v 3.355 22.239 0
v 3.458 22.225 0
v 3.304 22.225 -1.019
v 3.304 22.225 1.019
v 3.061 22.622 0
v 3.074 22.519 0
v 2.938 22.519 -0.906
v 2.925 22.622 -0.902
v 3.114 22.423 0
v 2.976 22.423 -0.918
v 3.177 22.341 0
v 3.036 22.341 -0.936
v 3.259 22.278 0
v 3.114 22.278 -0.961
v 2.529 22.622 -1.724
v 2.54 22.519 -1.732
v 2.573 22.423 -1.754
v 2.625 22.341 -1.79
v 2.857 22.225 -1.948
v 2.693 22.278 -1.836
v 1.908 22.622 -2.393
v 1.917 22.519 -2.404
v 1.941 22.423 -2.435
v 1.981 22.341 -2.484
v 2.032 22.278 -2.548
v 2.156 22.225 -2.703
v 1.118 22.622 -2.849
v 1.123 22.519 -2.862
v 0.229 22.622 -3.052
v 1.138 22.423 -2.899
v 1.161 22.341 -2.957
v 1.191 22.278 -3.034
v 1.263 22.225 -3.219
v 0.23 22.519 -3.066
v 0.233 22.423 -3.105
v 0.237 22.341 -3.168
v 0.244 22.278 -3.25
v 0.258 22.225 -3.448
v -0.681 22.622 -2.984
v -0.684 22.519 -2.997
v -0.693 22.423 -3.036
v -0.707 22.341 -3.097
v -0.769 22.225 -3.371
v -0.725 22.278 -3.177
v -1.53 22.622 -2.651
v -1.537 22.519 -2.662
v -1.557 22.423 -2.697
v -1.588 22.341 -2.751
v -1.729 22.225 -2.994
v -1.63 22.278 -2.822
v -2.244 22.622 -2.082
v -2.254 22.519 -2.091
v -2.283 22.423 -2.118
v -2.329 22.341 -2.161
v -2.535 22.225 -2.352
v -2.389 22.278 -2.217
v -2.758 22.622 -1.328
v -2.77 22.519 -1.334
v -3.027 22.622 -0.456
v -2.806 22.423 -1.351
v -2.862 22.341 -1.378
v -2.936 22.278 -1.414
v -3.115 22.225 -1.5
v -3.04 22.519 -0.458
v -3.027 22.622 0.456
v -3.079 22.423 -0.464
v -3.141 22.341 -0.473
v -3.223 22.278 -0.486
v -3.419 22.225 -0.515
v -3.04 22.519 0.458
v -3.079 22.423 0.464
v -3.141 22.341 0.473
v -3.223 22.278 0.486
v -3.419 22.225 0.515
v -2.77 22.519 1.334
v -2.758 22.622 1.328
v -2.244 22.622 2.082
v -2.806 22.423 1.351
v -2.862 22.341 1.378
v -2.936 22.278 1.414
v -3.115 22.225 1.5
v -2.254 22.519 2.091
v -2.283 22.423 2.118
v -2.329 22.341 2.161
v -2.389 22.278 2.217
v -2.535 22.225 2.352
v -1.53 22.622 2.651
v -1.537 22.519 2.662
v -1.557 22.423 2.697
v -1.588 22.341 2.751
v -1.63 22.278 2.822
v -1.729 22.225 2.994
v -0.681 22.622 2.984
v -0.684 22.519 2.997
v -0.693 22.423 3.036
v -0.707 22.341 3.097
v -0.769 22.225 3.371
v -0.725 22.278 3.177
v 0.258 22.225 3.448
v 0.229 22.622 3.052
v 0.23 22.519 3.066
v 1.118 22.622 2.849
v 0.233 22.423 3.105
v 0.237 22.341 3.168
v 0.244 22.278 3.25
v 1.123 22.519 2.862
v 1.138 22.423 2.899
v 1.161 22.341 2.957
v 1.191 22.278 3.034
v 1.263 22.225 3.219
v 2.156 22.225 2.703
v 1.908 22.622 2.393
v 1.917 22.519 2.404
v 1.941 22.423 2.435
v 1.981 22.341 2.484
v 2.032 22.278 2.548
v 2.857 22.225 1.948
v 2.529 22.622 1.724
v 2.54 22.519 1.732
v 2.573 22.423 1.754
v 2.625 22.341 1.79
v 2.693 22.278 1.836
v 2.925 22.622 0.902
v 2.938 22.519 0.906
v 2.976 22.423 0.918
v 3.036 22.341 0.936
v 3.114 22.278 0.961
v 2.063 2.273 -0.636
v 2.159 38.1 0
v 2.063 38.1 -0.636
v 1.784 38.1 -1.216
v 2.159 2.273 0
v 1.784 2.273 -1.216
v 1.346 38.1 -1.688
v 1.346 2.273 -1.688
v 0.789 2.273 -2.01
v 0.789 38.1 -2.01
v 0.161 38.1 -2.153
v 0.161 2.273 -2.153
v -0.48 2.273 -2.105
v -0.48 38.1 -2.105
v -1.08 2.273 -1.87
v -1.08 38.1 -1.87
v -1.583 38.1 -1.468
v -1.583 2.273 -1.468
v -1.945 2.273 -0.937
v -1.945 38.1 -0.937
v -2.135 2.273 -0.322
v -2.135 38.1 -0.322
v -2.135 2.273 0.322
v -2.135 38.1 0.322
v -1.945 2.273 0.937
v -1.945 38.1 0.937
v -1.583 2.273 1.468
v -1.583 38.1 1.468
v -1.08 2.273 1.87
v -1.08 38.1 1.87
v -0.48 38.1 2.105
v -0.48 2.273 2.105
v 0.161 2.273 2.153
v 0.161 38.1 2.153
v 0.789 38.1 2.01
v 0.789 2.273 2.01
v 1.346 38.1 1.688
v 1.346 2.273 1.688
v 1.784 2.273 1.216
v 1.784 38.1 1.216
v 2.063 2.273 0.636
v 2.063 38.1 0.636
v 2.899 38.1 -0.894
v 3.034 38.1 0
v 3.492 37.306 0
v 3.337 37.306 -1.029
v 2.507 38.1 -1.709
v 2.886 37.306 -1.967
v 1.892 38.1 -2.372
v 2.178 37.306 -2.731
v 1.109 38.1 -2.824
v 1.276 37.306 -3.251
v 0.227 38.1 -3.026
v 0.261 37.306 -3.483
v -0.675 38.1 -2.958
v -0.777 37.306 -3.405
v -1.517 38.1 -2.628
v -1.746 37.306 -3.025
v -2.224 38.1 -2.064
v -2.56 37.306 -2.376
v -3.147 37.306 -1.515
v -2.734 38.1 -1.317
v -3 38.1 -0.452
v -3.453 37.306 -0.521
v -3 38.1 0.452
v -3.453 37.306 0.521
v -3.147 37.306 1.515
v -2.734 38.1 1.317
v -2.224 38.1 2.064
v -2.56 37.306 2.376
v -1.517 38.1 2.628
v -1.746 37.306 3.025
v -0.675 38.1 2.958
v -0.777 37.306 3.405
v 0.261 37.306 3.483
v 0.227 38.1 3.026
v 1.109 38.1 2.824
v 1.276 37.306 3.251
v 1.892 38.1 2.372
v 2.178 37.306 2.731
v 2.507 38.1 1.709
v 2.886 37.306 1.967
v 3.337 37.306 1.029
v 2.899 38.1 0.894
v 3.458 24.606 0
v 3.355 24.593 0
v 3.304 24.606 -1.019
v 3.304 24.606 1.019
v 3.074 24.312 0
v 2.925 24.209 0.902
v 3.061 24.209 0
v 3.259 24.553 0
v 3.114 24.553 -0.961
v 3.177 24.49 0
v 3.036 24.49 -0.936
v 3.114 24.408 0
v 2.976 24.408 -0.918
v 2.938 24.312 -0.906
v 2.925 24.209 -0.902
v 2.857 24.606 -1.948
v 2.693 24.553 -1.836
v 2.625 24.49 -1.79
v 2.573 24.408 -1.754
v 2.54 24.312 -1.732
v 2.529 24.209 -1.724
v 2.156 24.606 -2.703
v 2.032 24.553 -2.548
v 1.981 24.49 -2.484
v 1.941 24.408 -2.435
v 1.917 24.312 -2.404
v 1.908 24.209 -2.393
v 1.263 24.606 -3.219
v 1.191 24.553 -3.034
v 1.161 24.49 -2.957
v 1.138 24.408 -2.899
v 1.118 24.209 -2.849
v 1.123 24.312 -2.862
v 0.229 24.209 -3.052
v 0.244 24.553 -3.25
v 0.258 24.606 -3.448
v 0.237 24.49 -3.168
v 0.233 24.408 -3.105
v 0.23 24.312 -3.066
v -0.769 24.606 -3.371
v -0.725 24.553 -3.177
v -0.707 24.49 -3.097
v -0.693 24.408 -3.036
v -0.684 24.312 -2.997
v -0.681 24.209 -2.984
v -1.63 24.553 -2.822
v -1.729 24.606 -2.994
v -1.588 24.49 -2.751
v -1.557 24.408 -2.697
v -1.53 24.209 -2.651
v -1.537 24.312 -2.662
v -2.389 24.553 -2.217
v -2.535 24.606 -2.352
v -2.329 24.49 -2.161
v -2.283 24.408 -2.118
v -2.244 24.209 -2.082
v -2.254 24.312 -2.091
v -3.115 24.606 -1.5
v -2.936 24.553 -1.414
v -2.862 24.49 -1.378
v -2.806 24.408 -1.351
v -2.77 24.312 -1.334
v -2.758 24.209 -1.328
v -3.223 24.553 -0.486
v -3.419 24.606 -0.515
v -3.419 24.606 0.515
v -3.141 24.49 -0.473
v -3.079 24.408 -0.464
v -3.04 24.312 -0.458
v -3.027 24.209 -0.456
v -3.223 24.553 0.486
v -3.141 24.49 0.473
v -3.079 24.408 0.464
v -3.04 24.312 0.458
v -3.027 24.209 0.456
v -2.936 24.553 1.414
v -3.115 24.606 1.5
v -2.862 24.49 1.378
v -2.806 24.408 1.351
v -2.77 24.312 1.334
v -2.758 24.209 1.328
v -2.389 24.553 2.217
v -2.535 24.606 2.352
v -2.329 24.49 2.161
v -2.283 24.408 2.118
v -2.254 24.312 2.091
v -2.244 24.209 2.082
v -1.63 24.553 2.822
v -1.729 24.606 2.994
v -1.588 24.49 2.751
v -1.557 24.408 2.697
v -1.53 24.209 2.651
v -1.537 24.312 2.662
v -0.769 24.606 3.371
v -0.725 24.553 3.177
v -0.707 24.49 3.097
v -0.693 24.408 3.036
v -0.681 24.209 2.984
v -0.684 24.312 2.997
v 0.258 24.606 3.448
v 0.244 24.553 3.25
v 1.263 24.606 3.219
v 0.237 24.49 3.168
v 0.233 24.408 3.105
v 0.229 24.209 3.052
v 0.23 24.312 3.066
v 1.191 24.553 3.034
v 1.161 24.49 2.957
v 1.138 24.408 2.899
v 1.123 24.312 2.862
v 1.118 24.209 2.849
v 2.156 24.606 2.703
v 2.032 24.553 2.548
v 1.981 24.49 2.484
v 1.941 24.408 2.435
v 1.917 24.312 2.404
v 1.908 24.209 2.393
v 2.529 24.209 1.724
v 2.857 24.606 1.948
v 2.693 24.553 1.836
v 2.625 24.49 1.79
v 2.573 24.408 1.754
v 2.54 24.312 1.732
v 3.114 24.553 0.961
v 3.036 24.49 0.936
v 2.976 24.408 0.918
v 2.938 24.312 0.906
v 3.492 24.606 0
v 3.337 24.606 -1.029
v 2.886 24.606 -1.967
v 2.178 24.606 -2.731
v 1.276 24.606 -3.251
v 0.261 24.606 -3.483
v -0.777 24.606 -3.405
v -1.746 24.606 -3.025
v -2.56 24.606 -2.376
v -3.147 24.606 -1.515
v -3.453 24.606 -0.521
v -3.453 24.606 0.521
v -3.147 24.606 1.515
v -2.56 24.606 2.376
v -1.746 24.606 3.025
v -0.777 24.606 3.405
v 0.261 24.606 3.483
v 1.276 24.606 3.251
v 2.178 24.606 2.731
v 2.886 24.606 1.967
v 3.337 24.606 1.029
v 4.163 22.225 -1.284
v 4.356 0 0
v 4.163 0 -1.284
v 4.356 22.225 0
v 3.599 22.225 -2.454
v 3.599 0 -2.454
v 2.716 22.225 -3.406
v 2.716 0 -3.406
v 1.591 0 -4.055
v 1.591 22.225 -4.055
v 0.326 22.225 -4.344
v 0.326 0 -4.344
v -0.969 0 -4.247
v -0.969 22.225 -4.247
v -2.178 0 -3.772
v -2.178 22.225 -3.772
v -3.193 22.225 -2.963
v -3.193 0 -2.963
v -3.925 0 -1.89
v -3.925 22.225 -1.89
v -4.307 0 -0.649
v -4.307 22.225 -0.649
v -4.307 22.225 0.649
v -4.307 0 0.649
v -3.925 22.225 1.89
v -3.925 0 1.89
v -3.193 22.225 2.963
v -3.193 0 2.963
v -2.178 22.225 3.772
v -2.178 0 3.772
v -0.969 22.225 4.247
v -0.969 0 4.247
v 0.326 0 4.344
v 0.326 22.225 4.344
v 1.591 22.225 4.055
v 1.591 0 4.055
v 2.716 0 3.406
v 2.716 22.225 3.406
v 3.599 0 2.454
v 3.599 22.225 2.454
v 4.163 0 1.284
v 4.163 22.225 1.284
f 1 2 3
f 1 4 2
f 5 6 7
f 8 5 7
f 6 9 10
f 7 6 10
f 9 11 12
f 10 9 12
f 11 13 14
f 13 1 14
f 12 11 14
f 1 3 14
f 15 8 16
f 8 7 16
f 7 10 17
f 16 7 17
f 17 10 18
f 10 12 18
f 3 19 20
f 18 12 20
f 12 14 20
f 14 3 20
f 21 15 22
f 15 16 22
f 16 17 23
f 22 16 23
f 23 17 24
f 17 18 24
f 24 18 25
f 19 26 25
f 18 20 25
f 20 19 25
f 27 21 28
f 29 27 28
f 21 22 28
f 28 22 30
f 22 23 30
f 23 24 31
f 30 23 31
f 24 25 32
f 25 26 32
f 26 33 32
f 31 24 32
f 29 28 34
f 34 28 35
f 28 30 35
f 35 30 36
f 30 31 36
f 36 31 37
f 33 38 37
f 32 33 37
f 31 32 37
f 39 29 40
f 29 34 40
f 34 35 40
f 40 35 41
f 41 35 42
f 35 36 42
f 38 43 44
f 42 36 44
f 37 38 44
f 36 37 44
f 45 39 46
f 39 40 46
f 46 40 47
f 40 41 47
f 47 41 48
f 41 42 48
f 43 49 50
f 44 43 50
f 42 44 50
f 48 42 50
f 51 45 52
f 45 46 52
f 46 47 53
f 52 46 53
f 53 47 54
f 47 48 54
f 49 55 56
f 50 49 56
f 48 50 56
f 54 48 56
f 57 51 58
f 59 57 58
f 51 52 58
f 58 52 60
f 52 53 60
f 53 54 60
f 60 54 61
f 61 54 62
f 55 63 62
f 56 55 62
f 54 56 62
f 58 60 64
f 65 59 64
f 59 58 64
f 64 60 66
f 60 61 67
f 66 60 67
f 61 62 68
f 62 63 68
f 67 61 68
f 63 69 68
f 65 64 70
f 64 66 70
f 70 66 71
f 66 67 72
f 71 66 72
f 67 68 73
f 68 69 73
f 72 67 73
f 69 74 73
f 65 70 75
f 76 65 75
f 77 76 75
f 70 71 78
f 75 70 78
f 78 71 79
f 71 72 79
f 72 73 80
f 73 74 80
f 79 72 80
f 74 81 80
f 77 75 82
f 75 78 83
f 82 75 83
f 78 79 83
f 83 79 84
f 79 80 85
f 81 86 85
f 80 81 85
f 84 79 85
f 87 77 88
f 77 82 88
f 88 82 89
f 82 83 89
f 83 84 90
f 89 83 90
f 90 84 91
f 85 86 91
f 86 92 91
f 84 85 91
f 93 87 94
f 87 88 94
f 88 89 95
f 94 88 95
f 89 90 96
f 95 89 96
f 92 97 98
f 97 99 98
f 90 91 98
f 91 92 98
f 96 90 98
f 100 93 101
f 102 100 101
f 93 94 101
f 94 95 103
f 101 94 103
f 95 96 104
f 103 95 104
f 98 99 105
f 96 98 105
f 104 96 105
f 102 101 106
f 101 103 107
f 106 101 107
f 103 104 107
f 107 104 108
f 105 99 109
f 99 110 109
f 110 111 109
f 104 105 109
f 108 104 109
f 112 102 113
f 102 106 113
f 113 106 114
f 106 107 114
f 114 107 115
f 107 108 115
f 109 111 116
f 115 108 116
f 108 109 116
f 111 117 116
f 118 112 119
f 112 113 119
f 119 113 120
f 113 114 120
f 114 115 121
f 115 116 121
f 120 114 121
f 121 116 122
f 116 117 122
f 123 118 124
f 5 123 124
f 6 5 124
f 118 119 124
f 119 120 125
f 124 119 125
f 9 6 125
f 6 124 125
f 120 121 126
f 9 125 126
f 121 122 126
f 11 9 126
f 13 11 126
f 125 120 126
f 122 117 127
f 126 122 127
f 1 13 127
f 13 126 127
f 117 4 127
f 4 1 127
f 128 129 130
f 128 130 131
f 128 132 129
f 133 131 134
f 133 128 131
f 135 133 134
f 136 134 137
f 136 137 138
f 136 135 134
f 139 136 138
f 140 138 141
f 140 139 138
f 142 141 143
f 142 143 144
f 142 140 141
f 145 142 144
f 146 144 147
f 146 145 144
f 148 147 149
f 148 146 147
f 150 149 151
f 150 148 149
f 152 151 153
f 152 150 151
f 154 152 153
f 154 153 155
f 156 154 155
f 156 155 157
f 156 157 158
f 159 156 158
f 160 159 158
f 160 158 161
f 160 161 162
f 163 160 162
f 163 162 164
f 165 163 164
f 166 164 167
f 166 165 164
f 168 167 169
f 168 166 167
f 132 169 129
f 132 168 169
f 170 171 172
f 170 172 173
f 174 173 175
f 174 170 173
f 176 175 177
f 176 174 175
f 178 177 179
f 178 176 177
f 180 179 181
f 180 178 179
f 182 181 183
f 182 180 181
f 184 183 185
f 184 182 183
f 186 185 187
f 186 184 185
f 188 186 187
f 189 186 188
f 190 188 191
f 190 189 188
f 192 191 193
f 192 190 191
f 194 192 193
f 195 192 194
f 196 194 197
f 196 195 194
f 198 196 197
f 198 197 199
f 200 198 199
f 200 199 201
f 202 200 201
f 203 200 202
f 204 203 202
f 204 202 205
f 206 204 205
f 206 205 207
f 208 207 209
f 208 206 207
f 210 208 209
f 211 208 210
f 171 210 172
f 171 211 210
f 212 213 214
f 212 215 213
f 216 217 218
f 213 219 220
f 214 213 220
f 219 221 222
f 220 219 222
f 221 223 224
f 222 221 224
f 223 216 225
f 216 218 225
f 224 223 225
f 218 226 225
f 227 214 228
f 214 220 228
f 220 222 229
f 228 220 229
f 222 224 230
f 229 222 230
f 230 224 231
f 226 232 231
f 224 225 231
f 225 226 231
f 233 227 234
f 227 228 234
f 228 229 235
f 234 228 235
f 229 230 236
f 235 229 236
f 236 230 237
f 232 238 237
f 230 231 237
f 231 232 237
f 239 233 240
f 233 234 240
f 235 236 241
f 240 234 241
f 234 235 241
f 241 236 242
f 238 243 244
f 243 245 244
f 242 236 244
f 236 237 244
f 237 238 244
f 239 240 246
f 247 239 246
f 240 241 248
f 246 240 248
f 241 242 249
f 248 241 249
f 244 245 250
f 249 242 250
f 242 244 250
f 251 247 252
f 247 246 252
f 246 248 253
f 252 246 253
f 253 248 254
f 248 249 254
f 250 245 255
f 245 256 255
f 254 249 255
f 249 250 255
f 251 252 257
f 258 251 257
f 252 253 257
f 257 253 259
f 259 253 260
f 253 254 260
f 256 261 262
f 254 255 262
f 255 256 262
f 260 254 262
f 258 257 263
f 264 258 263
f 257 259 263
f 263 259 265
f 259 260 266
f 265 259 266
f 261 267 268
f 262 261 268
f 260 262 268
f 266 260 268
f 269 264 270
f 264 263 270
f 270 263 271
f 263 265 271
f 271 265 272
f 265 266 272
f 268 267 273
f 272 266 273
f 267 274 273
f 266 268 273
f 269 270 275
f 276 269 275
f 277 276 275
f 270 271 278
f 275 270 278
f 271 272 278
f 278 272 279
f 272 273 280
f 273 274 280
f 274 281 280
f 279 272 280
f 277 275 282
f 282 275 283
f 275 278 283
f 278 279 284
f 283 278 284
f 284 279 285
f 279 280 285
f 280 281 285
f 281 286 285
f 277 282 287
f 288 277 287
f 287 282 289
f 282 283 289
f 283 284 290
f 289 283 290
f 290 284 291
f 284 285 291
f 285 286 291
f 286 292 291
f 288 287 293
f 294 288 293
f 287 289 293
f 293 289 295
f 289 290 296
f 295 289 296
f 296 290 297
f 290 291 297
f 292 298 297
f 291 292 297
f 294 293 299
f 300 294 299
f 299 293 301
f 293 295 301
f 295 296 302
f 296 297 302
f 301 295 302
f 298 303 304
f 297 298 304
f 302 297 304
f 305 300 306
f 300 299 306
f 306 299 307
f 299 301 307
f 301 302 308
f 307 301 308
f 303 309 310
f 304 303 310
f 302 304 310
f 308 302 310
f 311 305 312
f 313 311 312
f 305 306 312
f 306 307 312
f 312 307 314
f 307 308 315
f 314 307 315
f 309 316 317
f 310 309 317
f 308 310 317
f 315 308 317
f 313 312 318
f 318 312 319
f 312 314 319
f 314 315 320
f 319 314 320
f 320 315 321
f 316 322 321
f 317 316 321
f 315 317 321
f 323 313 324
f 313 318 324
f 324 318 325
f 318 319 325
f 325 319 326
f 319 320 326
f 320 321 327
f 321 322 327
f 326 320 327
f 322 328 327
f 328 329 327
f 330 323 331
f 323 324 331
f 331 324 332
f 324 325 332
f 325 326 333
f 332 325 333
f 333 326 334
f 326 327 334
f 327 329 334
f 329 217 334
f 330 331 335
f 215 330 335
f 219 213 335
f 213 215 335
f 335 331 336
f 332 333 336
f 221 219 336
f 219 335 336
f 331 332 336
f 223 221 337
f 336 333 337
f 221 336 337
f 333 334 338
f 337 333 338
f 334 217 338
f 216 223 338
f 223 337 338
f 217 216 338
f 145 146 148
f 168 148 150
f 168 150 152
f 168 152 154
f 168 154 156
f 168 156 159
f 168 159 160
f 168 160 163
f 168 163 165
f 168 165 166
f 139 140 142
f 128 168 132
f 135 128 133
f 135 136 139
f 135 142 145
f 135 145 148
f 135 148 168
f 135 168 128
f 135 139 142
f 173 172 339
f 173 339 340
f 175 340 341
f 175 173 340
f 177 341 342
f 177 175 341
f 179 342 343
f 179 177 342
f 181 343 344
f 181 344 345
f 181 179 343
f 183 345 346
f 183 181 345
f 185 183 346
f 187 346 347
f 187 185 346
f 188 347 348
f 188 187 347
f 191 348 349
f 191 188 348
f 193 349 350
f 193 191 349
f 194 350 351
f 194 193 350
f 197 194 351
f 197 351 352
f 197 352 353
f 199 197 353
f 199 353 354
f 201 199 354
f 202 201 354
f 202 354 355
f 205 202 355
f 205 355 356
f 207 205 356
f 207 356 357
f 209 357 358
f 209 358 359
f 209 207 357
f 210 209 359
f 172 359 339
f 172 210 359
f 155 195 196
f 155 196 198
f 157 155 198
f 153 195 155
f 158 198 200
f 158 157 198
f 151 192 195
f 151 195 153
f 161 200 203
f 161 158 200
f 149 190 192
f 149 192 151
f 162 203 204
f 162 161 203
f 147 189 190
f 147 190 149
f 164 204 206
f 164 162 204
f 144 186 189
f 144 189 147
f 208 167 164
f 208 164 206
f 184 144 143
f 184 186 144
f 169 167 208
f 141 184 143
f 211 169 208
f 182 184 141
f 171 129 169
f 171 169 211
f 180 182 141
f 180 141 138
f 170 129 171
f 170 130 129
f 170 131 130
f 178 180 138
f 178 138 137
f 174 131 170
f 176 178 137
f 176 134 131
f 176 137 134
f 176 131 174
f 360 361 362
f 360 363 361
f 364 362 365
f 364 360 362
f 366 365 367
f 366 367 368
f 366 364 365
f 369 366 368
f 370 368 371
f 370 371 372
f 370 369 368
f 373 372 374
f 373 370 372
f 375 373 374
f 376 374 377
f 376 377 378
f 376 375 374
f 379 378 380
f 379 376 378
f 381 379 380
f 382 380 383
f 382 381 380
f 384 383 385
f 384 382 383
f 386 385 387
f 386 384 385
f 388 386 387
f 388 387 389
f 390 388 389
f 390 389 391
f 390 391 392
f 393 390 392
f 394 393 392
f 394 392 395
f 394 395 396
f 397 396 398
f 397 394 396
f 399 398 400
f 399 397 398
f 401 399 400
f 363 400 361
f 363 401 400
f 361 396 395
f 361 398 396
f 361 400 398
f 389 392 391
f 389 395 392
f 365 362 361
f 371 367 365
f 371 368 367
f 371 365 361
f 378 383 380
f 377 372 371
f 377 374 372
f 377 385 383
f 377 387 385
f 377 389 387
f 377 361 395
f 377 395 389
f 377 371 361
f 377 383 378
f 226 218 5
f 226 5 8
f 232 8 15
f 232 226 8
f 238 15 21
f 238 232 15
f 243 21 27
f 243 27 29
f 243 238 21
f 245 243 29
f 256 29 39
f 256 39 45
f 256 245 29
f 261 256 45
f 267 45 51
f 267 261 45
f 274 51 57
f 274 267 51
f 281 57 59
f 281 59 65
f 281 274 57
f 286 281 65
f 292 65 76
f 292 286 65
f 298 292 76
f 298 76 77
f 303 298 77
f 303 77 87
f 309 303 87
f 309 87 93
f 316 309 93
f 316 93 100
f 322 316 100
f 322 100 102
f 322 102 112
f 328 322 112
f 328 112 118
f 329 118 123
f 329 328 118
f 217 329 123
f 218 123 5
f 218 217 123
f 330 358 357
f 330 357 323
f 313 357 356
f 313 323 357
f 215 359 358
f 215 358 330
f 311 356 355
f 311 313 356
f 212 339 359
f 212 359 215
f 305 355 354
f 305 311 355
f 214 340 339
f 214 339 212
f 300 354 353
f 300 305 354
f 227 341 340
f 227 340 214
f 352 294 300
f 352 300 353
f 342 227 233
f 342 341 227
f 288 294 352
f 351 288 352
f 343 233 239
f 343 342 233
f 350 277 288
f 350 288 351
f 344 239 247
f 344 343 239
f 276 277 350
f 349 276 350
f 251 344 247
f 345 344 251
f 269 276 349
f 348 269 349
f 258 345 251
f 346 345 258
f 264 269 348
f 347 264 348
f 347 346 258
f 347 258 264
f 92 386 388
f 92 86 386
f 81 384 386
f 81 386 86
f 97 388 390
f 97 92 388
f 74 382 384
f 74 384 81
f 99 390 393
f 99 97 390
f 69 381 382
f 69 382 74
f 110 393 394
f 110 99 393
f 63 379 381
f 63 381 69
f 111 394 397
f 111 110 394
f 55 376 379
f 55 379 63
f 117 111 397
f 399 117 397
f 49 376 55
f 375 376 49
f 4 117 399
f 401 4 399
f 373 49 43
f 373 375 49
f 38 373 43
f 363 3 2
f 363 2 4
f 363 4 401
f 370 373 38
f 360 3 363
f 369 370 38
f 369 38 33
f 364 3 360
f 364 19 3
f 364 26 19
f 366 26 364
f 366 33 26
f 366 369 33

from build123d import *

# Parameters (mm, degrees)
CHAMFER1_SIZE  = 0.79375
CHAMFER1_SIZE2 = 0.458271776
FILLET1_R      = 0.396875


with BuildPart() as part:
    # Sketch1 → Revolve1 (revolve)
    with BuildSketch(Plane.XY):
        Polygon((0, 0), (4.3561, 0), (4.3561, 22.225), (3.0607, 22.225), (3.0607, 24.60625), (3.4925, 24.60625), (3.4925, 38.1), (2.159, 38.1), (2.159, 2.273235175), (0, 2.273235175), align=None)
    revolve(axis=Axis((0, 0, 0), (0, 1, 0)))

    # Chamfer1
    chamfer1_edges = [part.edges().sort_by_distance(p)[0] for p in [
        (-3.4925, 38.1, 0),
    ]]
    chamfer1_side = [part.faces().sort_by_distance(p)[0] for p in [
        (-3.4925, 31.353125, 0),
    ]]
    chamfer(chamfer1_edges, length=CHAMFER1_SIZE, length2=CHAMFER1_SIZE2, reference=chamfer1_side[0])

    # Fillet1
    fillet1_edges = [part.edges().sort_by_distance(p)[0] for p in [
        (-3.0607, 24.60625, 0),
        (-3.0607, 22.225, 0),
    ]]
    fillet(fillet1_edges, radius=FILLET1_R)


solid = part.part
